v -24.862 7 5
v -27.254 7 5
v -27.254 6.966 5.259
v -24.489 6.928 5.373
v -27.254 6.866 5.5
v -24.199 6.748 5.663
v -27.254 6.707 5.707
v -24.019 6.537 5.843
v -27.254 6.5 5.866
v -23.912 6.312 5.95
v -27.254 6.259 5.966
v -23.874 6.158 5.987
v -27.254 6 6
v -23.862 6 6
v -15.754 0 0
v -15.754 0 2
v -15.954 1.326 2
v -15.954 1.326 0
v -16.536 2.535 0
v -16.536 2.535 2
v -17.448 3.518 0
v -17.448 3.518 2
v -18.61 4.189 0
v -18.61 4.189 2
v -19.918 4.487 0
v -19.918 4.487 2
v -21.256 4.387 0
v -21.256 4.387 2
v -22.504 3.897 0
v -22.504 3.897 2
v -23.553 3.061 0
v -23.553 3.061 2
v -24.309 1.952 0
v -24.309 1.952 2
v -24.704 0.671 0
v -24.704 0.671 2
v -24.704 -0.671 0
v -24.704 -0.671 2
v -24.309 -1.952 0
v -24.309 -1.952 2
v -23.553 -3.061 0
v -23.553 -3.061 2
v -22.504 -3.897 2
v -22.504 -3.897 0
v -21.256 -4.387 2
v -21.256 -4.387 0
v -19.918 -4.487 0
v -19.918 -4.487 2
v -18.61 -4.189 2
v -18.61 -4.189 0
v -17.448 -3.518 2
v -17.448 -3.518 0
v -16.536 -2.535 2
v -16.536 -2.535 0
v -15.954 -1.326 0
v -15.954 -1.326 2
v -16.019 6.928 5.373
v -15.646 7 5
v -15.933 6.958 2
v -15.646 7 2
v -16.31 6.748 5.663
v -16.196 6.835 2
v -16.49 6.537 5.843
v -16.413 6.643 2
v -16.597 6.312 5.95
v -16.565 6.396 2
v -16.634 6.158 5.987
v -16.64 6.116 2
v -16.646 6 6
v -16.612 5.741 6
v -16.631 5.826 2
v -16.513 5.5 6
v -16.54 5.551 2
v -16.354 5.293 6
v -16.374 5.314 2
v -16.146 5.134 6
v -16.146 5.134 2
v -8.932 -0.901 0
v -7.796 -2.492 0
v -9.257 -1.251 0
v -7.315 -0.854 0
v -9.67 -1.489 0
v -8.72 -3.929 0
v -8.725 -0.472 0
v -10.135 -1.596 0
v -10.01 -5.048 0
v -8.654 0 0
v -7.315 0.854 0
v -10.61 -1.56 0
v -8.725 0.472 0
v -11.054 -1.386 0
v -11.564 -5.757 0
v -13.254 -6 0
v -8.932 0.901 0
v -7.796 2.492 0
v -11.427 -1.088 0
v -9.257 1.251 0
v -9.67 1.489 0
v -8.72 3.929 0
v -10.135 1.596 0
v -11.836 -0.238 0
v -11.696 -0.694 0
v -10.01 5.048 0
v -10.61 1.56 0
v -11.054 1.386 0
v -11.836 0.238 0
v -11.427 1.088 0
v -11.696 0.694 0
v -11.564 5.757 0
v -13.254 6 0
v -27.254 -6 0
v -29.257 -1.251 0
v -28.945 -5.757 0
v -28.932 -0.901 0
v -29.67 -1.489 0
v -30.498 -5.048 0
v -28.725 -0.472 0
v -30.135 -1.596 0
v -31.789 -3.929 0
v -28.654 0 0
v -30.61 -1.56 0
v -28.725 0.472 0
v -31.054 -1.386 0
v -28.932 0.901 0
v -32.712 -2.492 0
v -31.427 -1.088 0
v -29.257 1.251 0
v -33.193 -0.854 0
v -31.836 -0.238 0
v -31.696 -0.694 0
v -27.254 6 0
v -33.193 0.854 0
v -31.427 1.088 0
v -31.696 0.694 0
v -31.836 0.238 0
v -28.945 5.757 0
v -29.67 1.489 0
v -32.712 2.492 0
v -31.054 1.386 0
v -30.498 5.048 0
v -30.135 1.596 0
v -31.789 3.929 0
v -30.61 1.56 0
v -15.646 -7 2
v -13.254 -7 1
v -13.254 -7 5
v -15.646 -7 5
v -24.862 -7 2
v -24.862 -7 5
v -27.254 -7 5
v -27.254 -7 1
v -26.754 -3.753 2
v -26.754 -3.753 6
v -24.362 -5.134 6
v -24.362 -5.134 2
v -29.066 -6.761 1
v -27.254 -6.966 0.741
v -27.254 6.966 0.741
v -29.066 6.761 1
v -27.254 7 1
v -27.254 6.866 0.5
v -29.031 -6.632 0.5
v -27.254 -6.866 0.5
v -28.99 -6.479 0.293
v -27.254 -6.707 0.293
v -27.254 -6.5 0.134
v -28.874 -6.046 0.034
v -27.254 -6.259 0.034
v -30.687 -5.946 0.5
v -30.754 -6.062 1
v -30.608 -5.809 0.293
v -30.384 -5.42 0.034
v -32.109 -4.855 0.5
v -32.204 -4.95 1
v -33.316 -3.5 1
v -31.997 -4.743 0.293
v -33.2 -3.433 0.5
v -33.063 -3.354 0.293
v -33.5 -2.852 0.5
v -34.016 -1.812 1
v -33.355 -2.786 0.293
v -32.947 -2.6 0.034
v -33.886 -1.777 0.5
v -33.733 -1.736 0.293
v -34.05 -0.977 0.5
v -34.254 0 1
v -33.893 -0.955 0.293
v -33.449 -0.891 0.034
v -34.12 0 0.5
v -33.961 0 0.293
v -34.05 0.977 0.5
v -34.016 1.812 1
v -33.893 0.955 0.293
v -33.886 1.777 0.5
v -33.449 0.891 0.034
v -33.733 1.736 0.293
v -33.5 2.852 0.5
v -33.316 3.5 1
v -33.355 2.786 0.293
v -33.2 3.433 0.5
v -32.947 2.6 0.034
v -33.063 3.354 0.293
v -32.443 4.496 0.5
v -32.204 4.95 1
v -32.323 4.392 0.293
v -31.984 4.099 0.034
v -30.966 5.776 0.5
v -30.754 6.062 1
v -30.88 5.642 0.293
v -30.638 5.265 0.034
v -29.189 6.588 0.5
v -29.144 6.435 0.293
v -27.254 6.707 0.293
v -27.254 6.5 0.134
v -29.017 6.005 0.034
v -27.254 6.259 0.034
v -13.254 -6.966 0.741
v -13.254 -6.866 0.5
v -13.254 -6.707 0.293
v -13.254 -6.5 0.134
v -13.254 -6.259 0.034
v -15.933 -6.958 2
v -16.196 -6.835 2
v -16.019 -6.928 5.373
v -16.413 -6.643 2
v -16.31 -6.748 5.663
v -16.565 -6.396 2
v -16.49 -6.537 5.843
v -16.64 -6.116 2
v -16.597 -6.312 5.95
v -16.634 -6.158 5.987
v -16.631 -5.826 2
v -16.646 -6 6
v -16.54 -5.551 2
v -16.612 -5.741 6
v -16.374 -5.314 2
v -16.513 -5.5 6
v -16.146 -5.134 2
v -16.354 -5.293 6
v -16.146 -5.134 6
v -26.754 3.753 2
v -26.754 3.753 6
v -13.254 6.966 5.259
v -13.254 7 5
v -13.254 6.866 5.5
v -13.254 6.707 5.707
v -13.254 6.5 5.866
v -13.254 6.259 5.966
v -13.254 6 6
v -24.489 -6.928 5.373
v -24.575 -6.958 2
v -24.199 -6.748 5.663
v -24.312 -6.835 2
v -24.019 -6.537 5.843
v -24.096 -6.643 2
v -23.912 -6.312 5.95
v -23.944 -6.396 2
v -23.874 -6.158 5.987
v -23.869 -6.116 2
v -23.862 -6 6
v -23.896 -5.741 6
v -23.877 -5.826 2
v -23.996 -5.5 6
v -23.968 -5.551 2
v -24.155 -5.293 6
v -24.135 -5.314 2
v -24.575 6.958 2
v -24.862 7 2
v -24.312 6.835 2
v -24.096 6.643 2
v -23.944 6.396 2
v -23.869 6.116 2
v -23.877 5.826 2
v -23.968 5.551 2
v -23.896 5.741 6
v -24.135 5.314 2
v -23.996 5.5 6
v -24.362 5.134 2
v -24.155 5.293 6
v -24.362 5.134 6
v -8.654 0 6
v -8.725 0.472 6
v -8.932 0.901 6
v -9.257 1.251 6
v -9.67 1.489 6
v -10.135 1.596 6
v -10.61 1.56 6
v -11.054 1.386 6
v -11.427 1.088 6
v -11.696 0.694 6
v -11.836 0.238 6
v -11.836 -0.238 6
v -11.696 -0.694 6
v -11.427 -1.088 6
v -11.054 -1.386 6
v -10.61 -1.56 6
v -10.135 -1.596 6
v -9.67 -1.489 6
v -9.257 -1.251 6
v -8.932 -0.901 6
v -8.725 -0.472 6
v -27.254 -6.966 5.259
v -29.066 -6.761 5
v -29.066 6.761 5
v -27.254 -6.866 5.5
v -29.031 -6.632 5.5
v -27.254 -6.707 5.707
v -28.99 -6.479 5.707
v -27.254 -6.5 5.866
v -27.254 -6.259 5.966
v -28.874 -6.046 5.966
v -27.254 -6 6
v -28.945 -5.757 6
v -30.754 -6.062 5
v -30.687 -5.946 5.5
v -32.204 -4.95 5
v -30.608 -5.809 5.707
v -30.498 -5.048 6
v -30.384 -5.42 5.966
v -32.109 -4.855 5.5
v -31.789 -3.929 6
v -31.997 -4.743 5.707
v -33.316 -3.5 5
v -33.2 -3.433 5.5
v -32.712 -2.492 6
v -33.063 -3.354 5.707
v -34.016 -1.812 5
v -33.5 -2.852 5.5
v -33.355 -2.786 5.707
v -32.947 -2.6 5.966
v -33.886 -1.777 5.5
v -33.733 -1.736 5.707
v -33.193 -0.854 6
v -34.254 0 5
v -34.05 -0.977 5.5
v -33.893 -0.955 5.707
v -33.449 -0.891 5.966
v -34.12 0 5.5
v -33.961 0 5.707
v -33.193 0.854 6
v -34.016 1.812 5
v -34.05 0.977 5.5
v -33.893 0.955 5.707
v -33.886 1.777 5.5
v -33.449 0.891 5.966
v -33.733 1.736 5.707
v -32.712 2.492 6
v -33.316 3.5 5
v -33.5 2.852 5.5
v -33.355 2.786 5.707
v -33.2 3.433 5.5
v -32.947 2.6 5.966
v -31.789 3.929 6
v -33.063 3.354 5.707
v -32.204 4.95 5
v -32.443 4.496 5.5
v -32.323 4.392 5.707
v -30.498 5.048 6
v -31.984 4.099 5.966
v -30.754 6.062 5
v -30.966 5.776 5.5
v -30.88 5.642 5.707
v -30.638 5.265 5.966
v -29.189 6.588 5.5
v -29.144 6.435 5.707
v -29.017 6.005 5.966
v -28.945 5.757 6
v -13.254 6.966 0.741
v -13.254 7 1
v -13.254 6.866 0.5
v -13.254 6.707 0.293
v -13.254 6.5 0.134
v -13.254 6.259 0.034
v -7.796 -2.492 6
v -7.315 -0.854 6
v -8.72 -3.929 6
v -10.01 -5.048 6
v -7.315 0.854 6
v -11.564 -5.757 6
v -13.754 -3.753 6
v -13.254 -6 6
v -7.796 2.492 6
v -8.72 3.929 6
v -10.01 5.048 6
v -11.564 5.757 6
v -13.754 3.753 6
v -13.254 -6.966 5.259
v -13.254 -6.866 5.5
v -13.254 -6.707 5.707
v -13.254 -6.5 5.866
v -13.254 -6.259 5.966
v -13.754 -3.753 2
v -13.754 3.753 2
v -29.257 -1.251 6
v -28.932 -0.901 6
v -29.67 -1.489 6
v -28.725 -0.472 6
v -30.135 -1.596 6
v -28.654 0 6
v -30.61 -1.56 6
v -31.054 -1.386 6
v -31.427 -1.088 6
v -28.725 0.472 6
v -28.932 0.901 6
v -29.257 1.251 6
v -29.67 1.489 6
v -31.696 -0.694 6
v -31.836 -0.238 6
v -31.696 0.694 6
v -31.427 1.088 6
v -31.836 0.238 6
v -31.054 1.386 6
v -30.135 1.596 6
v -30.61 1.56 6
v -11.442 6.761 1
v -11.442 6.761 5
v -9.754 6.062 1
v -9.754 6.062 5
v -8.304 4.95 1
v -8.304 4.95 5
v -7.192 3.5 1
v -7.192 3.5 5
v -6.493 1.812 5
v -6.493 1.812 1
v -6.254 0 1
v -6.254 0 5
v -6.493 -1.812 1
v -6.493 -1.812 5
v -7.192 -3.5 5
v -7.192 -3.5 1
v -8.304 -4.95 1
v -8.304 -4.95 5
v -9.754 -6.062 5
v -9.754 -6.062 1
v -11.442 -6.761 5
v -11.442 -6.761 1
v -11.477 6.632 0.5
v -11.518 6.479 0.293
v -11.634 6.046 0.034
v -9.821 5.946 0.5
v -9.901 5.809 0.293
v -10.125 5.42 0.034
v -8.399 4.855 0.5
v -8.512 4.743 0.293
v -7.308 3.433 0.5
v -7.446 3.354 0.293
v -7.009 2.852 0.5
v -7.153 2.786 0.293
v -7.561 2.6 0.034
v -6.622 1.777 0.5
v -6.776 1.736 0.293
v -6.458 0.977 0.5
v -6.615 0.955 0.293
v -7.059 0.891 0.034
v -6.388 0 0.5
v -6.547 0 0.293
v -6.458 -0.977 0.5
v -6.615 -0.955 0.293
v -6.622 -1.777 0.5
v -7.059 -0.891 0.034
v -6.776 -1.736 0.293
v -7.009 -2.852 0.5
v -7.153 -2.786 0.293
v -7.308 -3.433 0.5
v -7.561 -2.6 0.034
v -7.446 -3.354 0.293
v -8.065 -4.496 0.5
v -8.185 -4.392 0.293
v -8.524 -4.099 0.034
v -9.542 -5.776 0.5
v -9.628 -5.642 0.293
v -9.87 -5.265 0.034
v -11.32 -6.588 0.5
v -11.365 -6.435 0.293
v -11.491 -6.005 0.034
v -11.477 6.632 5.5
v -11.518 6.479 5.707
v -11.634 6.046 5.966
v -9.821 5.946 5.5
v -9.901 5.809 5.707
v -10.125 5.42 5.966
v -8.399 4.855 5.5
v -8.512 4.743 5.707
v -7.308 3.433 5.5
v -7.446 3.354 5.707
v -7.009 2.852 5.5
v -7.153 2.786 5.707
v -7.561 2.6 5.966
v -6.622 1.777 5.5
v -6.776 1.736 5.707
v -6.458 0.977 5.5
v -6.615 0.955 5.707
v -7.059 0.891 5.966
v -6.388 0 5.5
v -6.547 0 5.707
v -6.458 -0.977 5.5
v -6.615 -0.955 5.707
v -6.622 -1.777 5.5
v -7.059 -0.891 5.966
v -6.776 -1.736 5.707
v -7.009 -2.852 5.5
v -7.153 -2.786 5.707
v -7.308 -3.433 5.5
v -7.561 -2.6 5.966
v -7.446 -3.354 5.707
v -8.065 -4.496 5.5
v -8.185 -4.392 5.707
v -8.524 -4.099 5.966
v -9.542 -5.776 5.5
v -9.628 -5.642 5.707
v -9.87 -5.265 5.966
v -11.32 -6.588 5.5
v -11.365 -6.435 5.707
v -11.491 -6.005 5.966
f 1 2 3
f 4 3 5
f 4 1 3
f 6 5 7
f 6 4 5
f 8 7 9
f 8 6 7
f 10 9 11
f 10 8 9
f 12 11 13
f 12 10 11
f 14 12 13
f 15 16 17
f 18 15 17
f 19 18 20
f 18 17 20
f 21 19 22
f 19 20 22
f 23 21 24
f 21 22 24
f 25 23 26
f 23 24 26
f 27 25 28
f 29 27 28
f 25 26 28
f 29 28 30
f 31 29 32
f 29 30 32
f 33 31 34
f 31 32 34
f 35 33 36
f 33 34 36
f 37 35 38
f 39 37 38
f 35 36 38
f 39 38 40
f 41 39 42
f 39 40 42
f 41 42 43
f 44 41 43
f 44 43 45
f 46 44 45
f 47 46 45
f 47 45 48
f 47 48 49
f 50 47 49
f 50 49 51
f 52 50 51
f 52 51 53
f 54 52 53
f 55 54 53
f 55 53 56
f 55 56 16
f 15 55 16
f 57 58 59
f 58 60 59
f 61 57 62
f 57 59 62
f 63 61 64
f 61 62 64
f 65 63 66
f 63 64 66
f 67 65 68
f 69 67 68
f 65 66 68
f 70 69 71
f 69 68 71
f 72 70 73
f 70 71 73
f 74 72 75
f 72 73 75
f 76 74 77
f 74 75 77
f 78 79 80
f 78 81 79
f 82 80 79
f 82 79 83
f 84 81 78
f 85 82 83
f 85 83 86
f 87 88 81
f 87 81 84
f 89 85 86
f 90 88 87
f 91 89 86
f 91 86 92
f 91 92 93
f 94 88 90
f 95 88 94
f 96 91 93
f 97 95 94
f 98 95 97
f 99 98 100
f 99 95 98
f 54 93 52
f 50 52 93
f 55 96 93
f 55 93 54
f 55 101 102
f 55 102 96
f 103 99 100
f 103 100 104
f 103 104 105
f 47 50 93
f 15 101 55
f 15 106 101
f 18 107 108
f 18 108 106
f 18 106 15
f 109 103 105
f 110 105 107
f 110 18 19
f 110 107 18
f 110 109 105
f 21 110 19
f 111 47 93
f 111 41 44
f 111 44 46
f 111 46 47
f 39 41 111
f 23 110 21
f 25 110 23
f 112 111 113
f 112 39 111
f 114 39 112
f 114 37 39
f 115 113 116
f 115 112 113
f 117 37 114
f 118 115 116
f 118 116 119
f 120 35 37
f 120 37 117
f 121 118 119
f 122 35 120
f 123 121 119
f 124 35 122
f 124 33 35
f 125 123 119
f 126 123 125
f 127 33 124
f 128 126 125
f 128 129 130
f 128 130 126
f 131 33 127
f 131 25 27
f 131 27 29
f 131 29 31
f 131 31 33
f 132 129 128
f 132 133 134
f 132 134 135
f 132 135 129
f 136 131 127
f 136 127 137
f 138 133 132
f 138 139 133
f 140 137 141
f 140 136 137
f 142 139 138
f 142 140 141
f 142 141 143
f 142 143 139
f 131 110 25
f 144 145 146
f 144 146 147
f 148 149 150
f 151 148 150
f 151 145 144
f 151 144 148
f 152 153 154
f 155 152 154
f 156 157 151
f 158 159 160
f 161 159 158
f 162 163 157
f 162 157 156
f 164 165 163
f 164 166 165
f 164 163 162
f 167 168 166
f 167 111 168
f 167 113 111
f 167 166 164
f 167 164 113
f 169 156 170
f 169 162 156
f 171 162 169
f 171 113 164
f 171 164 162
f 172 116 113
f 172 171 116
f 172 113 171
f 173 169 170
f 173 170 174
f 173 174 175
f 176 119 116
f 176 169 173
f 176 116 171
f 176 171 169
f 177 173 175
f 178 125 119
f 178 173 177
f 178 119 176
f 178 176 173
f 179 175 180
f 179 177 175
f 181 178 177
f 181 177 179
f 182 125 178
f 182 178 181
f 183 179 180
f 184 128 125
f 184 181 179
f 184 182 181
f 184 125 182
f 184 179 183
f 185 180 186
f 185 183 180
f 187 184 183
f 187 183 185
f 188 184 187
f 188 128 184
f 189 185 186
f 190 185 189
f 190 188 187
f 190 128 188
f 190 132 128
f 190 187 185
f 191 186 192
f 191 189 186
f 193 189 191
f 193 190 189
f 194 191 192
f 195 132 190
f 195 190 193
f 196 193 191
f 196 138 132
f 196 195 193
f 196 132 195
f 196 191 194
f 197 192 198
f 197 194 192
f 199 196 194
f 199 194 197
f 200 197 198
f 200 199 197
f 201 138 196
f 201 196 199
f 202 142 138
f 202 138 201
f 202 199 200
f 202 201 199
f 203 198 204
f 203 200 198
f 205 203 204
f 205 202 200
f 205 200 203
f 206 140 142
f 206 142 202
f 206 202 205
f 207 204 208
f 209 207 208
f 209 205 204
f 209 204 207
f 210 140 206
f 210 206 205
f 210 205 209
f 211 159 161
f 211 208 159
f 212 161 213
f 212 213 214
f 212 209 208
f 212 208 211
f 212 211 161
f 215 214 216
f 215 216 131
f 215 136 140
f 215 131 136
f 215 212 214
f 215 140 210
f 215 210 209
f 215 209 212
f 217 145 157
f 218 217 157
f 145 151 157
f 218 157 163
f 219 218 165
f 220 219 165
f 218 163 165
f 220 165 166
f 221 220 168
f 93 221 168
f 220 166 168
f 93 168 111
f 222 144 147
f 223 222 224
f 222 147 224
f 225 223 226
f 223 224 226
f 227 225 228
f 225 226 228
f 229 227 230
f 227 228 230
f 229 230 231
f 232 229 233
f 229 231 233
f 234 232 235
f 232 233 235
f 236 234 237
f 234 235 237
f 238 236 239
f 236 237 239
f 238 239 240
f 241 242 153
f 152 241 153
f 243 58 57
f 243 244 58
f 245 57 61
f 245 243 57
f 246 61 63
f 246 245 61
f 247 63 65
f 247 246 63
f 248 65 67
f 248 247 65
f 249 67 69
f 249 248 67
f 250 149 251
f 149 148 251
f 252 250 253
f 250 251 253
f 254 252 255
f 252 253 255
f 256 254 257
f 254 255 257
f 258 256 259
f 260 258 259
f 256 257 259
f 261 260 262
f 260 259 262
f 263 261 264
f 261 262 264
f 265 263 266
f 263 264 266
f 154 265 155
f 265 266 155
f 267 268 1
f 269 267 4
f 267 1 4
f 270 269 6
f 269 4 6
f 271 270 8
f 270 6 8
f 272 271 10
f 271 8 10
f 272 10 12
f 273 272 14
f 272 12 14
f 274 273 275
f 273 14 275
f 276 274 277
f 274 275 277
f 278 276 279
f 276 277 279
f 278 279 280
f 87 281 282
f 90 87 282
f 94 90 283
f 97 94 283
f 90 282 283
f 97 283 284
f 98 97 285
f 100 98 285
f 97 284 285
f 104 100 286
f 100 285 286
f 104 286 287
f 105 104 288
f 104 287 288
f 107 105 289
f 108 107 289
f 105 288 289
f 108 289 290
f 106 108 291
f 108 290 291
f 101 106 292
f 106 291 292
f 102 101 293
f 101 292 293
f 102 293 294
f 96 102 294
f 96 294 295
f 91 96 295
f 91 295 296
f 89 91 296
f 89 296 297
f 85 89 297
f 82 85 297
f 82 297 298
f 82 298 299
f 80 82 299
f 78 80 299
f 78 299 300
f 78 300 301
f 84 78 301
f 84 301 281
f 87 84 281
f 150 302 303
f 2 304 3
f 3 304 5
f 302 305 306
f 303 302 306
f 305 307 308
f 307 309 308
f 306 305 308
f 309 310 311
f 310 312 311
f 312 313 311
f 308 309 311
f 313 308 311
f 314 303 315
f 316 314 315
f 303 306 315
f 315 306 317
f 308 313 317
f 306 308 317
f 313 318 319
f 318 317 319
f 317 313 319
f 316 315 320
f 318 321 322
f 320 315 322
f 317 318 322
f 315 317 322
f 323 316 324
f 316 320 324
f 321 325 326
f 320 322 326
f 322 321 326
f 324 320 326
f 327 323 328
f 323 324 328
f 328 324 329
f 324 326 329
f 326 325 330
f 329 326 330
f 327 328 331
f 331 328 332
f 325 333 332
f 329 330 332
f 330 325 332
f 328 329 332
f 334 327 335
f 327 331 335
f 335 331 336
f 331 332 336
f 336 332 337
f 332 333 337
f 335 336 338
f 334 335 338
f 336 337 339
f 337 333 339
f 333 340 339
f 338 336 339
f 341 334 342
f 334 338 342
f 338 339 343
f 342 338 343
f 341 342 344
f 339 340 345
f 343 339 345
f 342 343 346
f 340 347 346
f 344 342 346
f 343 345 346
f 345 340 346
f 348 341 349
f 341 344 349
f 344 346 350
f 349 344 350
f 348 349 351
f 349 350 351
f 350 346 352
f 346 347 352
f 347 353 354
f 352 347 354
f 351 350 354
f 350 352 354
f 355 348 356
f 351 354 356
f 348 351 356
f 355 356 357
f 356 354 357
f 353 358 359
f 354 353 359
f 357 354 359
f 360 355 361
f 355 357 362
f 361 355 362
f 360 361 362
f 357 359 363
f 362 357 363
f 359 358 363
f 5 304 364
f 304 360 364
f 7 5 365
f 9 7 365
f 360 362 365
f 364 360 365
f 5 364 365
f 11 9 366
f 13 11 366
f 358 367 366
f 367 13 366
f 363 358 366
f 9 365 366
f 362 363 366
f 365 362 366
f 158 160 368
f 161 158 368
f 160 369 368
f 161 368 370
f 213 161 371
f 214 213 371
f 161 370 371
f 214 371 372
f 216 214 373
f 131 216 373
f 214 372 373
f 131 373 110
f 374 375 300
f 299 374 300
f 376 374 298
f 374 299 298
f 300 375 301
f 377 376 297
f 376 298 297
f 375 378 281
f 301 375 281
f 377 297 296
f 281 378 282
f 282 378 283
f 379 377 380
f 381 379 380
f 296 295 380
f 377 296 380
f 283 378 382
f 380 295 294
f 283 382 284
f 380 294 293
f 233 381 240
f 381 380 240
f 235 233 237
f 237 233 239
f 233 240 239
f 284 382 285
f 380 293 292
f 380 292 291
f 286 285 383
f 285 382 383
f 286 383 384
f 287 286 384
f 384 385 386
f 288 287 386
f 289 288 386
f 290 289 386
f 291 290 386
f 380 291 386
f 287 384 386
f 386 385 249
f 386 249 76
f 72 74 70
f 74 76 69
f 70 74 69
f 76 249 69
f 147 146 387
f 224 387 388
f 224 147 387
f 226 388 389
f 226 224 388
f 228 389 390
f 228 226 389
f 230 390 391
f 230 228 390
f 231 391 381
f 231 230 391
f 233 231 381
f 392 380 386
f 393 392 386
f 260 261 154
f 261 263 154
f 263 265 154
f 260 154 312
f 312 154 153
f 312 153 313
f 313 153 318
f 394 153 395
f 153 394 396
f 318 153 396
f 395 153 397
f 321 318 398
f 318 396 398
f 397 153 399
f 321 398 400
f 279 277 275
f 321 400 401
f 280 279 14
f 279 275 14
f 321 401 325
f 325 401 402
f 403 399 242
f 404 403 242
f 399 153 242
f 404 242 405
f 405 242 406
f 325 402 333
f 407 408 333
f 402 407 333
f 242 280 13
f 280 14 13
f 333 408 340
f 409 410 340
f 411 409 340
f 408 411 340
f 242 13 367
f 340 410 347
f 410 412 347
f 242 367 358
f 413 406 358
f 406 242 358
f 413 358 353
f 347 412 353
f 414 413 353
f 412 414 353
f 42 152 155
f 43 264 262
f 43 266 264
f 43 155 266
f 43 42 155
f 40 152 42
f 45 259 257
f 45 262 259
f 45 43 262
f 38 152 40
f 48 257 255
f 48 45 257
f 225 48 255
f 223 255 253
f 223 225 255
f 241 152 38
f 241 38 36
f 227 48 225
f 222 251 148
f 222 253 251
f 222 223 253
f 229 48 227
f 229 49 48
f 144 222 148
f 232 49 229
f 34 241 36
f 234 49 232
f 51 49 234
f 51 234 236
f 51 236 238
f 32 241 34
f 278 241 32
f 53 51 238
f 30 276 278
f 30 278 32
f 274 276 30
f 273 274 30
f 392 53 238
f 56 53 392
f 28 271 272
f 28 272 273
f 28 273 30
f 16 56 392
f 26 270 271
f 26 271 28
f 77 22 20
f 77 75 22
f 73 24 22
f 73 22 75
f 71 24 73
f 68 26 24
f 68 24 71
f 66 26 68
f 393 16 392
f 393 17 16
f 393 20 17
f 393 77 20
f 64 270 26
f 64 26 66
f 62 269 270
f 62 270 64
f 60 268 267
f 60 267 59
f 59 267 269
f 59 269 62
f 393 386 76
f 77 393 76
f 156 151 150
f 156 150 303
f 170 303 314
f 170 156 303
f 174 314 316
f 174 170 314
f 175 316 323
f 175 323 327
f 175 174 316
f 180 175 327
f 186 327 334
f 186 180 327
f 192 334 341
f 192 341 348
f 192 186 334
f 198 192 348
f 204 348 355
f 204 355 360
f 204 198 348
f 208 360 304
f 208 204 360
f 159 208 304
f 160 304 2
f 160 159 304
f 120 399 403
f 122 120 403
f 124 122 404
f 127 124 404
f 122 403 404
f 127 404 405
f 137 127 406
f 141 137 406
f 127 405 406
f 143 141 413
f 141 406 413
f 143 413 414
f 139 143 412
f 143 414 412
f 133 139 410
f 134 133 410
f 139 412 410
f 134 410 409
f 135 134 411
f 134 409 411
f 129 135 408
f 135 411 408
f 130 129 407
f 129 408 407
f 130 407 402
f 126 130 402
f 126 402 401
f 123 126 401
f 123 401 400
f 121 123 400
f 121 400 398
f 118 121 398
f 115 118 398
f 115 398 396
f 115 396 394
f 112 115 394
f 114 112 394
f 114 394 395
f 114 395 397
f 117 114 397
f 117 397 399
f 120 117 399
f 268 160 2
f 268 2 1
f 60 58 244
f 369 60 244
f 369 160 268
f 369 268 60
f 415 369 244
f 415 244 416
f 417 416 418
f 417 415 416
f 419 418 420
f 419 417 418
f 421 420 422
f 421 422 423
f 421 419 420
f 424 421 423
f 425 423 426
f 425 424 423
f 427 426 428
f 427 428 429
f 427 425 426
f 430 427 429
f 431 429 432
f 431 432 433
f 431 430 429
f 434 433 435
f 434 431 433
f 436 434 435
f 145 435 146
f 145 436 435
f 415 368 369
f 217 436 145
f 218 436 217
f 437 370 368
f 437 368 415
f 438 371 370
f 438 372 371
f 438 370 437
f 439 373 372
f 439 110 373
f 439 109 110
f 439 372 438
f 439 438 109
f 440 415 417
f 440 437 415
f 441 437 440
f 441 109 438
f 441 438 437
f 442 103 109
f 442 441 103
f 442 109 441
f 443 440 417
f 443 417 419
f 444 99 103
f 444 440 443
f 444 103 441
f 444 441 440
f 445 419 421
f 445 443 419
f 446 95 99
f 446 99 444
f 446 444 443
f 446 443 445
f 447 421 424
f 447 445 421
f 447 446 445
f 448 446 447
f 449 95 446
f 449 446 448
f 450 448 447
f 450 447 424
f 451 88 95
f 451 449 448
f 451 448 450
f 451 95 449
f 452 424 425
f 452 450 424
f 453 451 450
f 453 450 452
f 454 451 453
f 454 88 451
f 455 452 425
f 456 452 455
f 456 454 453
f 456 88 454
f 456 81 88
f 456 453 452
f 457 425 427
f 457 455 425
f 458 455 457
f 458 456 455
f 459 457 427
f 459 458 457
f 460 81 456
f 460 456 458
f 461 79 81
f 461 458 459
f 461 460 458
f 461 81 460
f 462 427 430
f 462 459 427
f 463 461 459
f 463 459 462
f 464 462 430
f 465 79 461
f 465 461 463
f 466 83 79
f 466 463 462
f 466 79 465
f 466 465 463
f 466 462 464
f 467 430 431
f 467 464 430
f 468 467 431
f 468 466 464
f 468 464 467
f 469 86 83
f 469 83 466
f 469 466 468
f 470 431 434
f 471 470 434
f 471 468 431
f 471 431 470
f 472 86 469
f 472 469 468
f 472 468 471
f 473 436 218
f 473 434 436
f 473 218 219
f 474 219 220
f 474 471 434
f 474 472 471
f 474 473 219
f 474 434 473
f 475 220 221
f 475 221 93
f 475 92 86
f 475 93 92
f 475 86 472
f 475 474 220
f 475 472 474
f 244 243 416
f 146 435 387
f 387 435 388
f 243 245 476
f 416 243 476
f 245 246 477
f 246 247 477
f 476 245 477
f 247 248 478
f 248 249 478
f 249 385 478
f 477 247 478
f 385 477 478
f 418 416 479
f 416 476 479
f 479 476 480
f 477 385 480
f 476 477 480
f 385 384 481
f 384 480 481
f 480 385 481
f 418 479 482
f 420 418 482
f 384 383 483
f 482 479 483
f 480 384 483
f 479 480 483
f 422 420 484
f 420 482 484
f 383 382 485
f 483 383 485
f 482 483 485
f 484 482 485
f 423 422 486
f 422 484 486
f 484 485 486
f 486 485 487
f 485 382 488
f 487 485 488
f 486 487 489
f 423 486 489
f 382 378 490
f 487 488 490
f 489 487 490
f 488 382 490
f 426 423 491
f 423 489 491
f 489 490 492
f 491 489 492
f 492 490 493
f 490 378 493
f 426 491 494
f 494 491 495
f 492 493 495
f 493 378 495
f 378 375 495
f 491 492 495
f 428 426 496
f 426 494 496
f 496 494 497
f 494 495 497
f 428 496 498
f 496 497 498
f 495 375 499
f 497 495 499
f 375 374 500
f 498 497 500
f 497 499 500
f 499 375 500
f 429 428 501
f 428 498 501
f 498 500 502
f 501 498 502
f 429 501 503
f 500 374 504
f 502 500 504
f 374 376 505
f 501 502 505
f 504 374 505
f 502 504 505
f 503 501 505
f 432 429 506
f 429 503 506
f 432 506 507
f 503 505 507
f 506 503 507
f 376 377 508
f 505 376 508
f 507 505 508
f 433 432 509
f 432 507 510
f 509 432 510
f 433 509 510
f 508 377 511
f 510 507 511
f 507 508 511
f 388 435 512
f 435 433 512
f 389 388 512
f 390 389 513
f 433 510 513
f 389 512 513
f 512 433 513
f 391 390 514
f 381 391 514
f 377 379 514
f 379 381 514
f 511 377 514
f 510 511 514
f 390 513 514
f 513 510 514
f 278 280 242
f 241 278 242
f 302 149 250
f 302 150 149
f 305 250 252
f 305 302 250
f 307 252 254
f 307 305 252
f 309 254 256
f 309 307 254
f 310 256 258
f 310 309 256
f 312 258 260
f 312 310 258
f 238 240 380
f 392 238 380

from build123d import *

# Parameters (mm, degrees)
BOSS_EXTRU_1_DEPTH      = 6
ESQUISSE3_R             = 4.5
ESQUISSE3_R_2           = 1.6
ENL_V_MAT_EXTRU_1_DEPTH = 7
ENL_V_MAT_EXTRU_2_DEPTH = 4
CONG_1_R                = 1


with BuildPart() as part:
    # Esquisse1 → Boss.-Extru.1 (new body)
    with BuildSketch(Plane.XY):
        with BuildLine():
            Line((-27.254178511, 7), (-13.254178511, 7))
            ThreePointArc((-13.254178511, 7), (-6.254178511, 0), (-13.254178511, -7))
            Line((-13.254178511, -7), (-27.254178511, -7))
            ThreePointArc((-27.254178511, -7), (-34.254178511, 0), (-27.254178511, 7))
        make_face()
    extrude(amount=BOSS_EXTRU_1_DEPTH)

    # Esquisse3 → Enlèv. mat.-Extru.1 (cut, through all)
    with BuildSketch(Plane.XY.offset(6)):
        with Locations((-20.254178511, 0)):
            Circle(ESQUISSE3_R)
        with Locations((-30.254178511, 0)):
            Circle(ESQUISSE3_R_2)
        with Locations((-10.254178511, 0)):
            Circle(ESQUISSE3_R_2)
    extrude(amount=-ENL_V_MAT_EXTRU_1_DEPTH, mode=Mode.SUBTRACT)

    # Esquisse4 → Enlèv. mat.-Extru.2 (cut)
    with BuildSketch(Plane.XY.offset(6)):
        Polygon((-13.754178511, -3.75277675), (-13.754178511, 3.75277675), (-20.254178511, 7.505553499), (-26.754178511, 3.75277675), (-26.754178511, -3.75277675), (-20.254178511, -7.505553499), align=None)
    extrude(amount=-ENL_V_MAT_EXTRU_2_DEPTH, mode=Mode.SUBTRACT)

    # Congé1
    cong_1_edges = [part.edges().sort_by_distance(p)[0] for p in [
        (-6.254178511, 0, 6),
        (-16.316356337, 7, 6),
        (-16.316356337, -7, 6),
        (-24.192000685, 7, 6),
        (-19.378534164, -7, 4),
        (-21.129822858, -7, 4),
        (-21.129822858, 7, 4),
        (-19.378534164, 7, 4),
        (-34.254178511, 0, 6),
        (-20.254178511, 7, 0),
        (-6.254178511, 0, 0),
        (-20.254178511, -7, 0),
        (-34.254178511, 0, 0),
        (-24.192000685, -7, 6),
    ]]
    fillet(cong_1_edges, radius=CONG_1_R)


solid = part.part
